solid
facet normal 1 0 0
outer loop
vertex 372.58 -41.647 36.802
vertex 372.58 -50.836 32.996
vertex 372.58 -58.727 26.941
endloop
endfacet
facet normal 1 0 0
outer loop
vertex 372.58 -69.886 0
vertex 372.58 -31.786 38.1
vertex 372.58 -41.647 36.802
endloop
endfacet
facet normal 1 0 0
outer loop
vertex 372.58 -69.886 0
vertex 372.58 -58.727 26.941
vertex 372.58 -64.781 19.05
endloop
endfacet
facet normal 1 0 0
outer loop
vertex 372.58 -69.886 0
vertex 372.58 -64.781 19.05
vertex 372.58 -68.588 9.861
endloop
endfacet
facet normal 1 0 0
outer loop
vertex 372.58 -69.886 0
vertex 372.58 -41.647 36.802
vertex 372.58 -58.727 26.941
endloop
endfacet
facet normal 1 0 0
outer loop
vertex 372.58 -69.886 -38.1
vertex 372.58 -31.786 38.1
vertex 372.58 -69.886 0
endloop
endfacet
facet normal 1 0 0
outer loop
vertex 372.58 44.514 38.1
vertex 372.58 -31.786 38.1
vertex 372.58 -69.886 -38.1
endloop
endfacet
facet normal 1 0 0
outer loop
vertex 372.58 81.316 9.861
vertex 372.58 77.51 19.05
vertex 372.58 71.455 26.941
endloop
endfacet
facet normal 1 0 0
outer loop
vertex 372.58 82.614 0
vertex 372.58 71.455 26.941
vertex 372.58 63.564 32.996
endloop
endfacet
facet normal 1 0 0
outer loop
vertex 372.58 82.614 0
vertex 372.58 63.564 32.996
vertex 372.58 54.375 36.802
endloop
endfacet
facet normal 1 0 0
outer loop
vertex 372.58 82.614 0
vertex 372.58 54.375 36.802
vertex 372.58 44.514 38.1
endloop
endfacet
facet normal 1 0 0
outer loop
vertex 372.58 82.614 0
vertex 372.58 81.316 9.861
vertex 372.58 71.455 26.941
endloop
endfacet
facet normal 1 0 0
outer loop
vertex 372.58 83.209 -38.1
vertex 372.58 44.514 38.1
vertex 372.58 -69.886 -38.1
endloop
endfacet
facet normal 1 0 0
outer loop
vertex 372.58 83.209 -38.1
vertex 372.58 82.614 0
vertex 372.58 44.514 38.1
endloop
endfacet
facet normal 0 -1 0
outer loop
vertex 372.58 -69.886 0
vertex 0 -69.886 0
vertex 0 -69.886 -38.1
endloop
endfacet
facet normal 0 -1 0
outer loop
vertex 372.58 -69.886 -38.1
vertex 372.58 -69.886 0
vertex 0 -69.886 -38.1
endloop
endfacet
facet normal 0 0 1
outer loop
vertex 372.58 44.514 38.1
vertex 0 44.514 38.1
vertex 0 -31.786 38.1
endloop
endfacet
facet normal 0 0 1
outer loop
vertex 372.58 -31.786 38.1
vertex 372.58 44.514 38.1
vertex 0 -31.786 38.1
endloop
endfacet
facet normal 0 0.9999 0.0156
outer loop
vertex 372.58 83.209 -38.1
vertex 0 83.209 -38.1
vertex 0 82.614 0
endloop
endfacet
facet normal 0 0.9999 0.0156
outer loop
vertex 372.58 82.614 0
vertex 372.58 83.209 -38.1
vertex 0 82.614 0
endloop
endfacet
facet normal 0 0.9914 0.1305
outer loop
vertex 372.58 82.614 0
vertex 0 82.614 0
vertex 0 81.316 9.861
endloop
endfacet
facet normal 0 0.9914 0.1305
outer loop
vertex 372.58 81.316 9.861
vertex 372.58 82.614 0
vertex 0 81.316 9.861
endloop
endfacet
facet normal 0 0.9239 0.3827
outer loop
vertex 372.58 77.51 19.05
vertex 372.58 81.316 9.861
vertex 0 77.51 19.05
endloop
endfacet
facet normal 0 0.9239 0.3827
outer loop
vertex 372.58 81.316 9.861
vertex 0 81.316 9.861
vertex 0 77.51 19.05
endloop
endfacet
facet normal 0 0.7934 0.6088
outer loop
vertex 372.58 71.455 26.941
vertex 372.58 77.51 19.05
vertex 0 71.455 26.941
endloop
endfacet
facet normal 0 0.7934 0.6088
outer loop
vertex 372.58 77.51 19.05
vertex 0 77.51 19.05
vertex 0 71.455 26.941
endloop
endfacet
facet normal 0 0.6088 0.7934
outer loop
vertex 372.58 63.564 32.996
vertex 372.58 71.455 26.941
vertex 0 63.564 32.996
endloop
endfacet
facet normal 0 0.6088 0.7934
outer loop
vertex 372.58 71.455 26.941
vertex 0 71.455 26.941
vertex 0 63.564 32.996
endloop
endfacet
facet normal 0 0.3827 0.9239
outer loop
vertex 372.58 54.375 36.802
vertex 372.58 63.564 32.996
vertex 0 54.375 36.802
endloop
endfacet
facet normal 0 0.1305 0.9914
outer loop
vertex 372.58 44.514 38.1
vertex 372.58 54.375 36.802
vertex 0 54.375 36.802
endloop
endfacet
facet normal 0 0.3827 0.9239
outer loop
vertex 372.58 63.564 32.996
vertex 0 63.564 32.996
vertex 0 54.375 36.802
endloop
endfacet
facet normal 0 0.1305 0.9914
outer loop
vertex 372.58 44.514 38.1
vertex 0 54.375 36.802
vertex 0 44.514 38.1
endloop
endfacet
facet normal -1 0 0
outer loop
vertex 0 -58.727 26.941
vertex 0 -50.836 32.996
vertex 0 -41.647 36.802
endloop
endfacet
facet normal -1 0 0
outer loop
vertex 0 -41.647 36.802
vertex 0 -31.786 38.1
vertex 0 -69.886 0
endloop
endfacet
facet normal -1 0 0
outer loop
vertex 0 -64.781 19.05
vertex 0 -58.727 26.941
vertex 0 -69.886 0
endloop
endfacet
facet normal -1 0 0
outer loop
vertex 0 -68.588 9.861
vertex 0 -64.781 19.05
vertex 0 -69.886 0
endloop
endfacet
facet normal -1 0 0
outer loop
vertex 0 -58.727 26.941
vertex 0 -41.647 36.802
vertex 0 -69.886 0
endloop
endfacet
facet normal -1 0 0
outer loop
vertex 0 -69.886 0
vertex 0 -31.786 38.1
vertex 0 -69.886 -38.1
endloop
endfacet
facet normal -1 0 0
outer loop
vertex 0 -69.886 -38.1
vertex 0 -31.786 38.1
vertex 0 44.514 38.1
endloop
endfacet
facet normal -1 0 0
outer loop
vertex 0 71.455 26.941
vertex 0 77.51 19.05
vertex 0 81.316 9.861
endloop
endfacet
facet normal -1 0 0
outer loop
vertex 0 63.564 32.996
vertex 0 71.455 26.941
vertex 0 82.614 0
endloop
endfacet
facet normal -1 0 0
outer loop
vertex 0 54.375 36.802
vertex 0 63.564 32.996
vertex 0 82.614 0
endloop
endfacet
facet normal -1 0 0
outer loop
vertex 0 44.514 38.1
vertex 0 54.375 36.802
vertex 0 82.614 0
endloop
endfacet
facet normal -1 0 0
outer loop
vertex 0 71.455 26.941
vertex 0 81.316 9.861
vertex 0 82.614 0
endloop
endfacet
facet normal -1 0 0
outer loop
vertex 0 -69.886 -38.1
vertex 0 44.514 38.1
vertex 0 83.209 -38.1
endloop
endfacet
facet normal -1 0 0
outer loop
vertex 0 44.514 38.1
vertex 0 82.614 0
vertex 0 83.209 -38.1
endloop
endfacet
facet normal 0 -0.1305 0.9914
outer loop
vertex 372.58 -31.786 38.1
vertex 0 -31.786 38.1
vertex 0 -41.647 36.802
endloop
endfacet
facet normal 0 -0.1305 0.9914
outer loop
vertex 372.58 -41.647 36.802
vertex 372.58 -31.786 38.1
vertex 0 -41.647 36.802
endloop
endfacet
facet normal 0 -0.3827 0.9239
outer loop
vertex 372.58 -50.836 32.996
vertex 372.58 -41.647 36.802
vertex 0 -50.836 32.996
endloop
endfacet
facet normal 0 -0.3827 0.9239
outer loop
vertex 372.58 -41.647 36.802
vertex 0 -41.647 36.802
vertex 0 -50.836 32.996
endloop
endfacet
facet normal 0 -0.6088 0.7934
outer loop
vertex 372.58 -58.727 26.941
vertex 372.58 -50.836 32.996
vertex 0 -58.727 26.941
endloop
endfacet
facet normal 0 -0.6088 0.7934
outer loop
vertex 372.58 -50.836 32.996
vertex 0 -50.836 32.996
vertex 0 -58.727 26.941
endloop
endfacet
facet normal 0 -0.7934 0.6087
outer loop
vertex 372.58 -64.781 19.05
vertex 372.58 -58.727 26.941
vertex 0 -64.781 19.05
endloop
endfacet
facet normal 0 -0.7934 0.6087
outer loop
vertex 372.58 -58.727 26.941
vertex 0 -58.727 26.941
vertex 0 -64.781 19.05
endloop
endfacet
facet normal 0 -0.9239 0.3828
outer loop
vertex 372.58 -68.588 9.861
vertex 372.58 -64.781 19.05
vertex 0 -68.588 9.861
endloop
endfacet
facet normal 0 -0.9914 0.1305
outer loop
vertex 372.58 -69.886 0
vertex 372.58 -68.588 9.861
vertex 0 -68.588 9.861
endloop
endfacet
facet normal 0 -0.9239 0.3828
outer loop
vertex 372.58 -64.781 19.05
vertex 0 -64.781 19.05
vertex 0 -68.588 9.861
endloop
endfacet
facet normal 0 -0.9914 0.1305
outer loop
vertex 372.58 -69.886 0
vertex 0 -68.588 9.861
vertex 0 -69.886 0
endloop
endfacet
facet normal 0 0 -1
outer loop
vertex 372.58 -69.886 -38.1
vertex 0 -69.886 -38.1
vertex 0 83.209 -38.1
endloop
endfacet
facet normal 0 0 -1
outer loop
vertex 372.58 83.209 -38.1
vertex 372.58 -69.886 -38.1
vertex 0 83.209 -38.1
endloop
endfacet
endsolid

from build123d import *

# Parameters (mm, degrees)
SALIENTE_EXTRUIR1_DEPTH = 372.58


with BuildPart() as part:
    # Croquis1 → Saliente-Extruir1 (new body)
    with BuildSketch(Plane(origin=(0, 0, 0), x_dir=(0, 0, -1), z_dir=(1, 0, 0))):
        with BuildLine():
            Line((38.1, 83.209074357), (0, 82.614095361))
            ThreePointArc((0, 82.614095361), (-26.940768363, 71.454863724), (-38.1, 44.514095361))
            Line((-38.1, 44.514095361), (-38.1, -31.785904639))
            ThreePointArc((-38.1, -31.785904639), (-26.940768363, -58.726673002), (0, -69.885904639))
            Line((0, -69.885904639), (38.1, -69.885904639))
            Line((38.1, -69.885904639), (38.1, 83.209074357))
        make_face()
    extrude(amount=SALIENTE_EXTRUIR1_DEPTH)


solid = part.part
